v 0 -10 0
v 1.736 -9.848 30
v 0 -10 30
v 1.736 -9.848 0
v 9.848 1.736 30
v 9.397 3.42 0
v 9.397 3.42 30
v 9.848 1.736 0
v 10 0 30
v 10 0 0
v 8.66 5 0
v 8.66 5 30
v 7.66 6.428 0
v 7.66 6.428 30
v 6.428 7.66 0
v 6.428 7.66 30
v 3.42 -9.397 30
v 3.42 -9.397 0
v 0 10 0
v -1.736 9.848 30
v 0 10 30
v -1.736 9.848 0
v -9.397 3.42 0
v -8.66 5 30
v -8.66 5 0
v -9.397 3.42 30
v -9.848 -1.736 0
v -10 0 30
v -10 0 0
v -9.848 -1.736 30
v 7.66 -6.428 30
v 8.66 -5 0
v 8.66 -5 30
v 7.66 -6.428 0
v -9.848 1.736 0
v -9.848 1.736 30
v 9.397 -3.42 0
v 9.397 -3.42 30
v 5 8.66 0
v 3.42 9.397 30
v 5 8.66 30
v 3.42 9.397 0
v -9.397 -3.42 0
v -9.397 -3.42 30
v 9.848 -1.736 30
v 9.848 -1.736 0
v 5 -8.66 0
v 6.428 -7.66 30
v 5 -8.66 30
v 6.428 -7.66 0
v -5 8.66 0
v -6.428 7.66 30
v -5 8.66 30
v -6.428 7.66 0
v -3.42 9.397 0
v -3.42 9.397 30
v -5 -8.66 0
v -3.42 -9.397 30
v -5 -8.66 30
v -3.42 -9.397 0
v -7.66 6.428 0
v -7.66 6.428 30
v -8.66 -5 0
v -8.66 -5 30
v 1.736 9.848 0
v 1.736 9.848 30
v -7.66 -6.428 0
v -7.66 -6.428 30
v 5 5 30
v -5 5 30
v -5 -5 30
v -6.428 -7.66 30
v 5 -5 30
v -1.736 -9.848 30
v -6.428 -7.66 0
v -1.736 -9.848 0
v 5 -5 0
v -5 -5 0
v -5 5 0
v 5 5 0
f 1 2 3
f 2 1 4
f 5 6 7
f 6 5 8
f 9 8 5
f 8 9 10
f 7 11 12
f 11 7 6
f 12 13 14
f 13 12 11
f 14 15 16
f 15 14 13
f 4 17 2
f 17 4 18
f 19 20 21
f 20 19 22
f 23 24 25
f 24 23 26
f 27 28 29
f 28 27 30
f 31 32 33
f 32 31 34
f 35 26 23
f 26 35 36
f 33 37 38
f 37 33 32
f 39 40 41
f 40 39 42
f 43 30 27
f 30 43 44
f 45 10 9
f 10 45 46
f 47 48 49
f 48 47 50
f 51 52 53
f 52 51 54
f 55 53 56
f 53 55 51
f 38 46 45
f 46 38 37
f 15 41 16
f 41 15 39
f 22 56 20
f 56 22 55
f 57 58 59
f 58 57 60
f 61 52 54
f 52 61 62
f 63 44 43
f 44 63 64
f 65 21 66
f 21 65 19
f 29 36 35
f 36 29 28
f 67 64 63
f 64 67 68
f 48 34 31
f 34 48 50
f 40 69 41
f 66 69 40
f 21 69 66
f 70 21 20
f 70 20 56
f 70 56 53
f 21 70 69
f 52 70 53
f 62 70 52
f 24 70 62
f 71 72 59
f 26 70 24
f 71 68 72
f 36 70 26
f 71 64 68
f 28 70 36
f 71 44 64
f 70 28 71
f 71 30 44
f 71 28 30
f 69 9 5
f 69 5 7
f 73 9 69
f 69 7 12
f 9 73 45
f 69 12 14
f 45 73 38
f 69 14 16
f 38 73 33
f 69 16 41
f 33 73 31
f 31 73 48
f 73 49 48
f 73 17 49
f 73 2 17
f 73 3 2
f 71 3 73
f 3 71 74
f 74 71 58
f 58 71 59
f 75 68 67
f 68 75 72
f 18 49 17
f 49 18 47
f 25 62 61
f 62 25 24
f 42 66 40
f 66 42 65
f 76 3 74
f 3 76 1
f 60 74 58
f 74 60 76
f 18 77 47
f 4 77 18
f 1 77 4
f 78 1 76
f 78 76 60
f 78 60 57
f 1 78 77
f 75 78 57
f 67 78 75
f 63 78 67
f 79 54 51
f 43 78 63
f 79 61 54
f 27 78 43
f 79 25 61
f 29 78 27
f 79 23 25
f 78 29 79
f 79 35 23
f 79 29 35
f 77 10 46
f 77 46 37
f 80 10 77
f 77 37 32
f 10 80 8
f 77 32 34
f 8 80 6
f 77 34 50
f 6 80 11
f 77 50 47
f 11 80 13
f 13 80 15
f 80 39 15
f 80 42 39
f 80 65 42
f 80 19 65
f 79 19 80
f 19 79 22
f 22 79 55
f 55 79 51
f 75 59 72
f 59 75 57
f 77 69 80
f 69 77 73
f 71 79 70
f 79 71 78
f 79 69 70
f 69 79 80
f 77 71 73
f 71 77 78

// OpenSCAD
//----------------------------------------------------------------------------

epsilon = 0.1;
$fn = 36;

//----------------------------------------------------------------------------

difference() {
  cylinder(d = 20, h = 30);

  translate([-5, -5, 0])
  translate([0, 0, -epsilon])
  cube([10, 10, 30 + 2 * epsilon]);
}

//----------------------------------------------------------------------------
// vim:ft=openscad
